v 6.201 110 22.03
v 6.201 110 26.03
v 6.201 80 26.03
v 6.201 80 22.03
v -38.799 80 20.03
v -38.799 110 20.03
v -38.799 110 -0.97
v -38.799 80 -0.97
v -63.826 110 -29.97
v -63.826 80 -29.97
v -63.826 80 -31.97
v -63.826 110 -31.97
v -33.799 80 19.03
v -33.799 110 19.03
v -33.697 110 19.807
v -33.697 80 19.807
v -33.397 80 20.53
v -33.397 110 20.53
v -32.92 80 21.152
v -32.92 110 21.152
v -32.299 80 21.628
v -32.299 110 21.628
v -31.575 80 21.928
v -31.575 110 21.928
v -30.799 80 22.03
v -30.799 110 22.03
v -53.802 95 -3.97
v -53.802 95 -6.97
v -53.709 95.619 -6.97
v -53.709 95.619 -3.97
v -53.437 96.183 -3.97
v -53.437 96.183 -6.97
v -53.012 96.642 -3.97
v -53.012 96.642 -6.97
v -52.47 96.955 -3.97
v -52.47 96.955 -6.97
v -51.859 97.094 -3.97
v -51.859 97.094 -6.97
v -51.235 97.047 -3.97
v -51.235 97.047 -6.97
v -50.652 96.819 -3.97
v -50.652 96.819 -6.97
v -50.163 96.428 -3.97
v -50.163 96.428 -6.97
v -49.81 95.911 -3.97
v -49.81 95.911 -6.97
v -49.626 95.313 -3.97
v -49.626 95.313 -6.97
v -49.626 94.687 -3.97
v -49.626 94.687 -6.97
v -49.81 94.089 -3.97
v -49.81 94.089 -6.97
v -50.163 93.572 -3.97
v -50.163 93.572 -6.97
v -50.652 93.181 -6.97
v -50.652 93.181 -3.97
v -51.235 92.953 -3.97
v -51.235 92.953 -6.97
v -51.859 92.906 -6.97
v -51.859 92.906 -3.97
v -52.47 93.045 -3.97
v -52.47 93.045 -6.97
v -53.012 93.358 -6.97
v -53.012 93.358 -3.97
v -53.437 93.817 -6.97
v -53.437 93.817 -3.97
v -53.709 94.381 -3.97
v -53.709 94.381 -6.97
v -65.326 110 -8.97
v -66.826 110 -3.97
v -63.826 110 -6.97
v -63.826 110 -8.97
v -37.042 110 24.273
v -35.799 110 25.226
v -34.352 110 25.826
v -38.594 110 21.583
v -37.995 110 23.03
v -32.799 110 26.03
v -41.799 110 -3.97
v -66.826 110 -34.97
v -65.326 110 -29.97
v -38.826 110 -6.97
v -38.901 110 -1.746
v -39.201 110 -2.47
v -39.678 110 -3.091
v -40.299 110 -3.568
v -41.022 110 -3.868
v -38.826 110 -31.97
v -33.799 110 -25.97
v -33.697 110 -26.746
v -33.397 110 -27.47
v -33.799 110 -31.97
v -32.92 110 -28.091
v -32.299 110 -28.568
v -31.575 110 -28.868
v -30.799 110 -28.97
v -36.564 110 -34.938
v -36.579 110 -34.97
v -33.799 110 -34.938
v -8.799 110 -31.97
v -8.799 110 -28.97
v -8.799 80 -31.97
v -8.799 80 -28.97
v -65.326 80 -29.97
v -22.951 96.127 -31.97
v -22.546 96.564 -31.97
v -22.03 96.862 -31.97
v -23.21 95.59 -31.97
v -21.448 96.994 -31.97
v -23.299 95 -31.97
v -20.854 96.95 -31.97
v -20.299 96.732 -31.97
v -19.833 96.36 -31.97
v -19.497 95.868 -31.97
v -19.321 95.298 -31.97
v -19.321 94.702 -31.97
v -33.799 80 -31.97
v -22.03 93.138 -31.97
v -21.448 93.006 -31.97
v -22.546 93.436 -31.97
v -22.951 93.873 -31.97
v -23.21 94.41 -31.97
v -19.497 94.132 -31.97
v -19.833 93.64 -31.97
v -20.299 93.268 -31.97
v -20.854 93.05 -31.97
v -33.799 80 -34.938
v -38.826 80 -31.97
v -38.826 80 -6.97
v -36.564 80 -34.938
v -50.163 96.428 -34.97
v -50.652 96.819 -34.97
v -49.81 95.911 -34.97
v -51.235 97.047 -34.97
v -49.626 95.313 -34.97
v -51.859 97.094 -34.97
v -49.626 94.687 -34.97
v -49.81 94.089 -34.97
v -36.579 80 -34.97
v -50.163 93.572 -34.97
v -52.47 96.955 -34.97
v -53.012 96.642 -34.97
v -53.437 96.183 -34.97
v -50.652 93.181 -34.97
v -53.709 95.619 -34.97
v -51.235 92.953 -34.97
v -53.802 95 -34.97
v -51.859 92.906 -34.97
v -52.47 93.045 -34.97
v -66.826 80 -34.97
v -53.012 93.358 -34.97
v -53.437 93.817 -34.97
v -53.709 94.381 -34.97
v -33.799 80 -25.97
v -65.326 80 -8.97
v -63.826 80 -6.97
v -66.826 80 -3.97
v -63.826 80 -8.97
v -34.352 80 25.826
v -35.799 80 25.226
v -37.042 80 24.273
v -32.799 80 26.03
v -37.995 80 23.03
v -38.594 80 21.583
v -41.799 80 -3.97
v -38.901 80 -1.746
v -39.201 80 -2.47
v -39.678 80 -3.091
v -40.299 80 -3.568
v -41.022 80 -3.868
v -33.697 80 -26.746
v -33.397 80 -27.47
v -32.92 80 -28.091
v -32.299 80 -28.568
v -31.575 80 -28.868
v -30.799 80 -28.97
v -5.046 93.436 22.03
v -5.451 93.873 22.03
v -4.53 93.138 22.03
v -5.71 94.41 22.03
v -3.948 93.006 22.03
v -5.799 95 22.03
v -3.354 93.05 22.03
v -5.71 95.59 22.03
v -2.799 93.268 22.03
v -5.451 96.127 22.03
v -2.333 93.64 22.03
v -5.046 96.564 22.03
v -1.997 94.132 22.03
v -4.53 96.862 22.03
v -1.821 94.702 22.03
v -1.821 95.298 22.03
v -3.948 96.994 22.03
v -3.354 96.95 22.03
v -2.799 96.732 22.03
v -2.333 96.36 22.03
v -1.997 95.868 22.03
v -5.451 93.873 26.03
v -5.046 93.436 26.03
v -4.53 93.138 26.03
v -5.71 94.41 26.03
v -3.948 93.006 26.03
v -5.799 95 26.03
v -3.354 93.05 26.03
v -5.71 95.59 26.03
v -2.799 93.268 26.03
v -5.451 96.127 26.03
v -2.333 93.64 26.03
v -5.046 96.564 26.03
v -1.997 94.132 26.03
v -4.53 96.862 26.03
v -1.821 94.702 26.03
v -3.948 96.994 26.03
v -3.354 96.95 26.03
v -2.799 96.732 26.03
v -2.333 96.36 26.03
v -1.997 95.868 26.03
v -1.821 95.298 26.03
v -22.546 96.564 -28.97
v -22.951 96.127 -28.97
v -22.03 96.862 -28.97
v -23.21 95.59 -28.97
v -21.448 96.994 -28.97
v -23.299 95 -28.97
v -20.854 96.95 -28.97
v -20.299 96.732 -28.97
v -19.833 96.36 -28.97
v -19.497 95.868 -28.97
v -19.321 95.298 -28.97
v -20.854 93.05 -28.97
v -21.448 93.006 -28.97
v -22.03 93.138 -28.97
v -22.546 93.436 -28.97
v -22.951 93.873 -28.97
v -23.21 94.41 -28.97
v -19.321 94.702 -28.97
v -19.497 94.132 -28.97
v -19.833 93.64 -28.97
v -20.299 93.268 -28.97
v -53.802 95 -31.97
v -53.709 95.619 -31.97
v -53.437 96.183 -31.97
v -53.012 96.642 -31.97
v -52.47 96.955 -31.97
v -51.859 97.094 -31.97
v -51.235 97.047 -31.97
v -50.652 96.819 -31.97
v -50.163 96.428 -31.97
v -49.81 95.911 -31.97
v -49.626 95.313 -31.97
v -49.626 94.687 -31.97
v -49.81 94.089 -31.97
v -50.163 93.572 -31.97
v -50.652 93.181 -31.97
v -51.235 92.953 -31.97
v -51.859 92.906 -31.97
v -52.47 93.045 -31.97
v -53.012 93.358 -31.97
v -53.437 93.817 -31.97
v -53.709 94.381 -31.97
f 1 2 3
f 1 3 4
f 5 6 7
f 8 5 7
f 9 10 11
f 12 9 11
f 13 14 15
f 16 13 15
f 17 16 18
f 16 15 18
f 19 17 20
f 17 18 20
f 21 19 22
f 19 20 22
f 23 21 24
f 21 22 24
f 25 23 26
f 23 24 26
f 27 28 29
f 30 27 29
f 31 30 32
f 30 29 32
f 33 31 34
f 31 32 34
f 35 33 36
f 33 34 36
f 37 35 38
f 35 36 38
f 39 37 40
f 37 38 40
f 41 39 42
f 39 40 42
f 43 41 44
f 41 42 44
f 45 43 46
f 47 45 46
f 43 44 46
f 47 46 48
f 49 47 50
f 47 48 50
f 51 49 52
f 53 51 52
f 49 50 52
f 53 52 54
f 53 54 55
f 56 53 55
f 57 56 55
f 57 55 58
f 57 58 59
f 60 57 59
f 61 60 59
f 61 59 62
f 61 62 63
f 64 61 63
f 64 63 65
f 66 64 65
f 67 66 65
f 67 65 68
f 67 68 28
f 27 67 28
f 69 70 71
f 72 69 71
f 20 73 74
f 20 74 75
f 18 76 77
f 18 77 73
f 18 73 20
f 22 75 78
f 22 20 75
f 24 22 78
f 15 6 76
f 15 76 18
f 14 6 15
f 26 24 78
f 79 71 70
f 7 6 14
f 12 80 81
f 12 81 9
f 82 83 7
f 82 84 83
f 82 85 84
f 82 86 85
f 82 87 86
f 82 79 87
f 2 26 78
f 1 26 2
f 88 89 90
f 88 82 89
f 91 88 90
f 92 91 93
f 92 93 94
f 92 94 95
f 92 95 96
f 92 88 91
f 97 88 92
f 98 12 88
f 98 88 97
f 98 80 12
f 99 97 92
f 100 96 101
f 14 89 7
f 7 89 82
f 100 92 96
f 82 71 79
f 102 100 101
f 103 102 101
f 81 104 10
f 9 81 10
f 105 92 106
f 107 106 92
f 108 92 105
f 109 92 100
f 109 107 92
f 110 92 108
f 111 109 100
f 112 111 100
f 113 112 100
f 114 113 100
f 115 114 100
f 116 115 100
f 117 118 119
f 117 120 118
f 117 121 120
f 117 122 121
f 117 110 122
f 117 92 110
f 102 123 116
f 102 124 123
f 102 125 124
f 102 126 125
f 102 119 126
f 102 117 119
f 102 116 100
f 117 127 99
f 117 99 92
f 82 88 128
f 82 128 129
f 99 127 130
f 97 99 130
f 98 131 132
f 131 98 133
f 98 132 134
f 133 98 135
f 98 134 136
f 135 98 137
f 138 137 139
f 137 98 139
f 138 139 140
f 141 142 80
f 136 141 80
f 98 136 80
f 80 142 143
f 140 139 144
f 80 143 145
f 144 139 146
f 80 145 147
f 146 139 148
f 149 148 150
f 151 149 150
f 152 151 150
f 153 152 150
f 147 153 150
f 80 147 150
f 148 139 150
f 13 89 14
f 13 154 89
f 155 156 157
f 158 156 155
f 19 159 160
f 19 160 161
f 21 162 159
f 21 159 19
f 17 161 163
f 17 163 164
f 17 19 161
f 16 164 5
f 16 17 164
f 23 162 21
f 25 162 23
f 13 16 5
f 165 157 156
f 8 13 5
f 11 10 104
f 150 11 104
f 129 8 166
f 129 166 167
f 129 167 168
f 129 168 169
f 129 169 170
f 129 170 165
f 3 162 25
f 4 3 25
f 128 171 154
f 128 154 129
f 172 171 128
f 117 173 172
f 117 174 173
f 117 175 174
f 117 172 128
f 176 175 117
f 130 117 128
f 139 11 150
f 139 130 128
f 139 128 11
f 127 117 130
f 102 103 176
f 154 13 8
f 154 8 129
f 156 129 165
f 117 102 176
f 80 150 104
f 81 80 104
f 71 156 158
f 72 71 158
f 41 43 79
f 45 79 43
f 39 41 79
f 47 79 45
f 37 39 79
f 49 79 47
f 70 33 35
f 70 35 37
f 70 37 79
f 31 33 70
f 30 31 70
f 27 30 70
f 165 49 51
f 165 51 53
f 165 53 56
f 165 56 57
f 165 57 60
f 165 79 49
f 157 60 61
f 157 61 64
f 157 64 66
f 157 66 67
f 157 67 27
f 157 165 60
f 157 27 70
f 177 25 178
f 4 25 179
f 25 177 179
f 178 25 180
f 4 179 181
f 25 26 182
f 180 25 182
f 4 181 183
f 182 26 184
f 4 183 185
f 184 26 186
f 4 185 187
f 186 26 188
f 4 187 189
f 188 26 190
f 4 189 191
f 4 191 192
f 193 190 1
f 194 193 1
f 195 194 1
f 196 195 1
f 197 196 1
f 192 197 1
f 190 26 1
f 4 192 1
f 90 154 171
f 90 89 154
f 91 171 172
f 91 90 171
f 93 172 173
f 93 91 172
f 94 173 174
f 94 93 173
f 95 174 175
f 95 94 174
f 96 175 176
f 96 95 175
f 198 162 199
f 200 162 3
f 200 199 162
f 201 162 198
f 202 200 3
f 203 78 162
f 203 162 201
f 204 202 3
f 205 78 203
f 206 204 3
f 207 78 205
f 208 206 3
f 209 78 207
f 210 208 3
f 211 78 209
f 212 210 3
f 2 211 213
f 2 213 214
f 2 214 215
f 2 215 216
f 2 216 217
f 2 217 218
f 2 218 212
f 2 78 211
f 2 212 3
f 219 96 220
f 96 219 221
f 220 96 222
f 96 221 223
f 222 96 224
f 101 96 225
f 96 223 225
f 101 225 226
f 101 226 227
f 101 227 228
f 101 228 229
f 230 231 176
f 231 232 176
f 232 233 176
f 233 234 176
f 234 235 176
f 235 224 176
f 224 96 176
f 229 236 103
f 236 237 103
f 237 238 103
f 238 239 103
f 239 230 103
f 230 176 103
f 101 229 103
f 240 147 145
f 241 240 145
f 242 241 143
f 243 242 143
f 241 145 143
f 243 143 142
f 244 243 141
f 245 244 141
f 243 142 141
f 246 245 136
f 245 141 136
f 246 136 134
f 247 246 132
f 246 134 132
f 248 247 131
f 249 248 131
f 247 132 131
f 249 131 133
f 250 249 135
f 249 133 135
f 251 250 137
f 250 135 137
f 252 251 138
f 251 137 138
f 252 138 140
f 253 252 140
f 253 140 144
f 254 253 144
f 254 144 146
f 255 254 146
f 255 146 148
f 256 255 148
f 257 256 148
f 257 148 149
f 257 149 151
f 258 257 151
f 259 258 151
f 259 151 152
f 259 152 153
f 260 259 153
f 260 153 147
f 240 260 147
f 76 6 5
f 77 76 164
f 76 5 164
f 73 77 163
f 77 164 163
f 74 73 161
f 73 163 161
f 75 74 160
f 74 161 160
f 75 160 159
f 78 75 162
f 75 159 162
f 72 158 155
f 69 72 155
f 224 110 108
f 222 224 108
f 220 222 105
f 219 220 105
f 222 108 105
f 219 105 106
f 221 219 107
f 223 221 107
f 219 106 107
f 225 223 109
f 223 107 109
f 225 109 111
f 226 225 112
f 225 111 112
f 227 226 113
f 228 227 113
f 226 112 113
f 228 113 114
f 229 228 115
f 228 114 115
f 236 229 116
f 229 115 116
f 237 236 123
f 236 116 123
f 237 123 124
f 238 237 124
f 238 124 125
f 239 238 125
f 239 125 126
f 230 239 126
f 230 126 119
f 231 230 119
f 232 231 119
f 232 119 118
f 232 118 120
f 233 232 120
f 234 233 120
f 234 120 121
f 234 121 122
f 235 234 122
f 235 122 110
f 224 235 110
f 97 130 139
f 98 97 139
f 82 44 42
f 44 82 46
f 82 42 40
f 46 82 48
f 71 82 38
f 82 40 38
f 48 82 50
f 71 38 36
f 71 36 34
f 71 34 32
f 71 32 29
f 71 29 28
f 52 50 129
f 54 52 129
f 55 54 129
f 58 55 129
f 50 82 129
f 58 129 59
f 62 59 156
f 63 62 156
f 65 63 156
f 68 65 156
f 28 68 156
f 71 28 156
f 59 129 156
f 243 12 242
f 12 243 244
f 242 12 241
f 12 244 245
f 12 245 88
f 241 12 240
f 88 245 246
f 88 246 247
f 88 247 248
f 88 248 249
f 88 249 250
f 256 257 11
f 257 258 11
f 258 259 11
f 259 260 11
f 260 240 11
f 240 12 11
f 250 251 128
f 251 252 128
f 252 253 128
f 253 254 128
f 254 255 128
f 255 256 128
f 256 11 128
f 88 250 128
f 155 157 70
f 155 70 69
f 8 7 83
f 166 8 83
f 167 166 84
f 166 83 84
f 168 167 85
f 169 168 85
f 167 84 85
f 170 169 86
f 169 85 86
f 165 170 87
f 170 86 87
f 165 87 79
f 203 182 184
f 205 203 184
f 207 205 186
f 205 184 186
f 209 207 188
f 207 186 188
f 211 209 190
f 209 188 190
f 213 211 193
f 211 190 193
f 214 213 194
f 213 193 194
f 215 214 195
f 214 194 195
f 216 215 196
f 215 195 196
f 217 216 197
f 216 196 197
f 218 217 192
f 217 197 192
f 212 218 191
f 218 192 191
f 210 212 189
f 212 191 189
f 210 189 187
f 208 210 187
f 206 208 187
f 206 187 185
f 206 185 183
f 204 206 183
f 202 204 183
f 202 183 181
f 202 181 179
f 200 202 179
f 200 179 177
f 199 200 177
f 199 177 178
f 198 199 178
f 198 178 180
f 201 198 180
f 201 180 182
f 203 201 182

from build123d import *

# Parameters (mm, degrees)
EXTRUDE_1_DEPTH      = 110
CUT_EXTRUDE_4_DEPTH  = 134.373777696
SKETCH_7_W           = 16.60831278
SKETCH_7_H           = 38.473598513
CUT_EXTRUDE_14_DEPTH = 134.373777696
SKETCH_8_W           = 5
SKETCH_8_H           = 30.968526609
EXTRUDE_2_DEPTH      = 110
SKETCH_10_W          = 5
SKETCH_10_H          = 26
EXTRUDE_4_DEPTH      = 110
SKETCH_16_W          = 45
SKETCH_16_H          = 4
EXTRUDE_7_DEPTH      = 110
FILLET_4_R           = 3
FILLET_5_R           = 6
SKETCH_18_W          = 113.67218818
SKETCH_18_H          = 61.649849458
CUT_EXTRUDE_18_DEPTH = 137.586229955
SKETCH_19_R          = 2.1
SKETCH_19_R_2        = 2
CUT_EXTRUDE_19_DEPTH = 143.431323365
SKETCH_22_W          = 25
SKETCH_22_H          = 3
EXTRUDE_10_DEPTH     = 30
FILLET_7_R           = 3
SKETCH_23_R          = 2
CUT_EXTRUDE_24_DEPTH = 10
SKETCH_24_W          = 79.129869038
SKETCH_24_H          = 20.357001259
CUT_EXTRUDE_25_DEPTH = 143.431323365


# Read off the part's stored shape, not the designer's step: Бобышка-Вытянуть1
with BuildPart() as part:
    # Бобышка-Вытянуть1 outline → Бобышка-Вытянуть1 (new body)
    with BuildSketch(Plane(origin=(0, 0, 0), x_dir=(1, 0, 0), z_dir=(0, 1, 0))):
        Polygon((-36.579007505, 34.969739794), (-66.825757576, 34.969739794), (-66.825757576, 29.969739794), (-63.825757576, 29.969739794), (-63.825757576, 31.969739794), (-38.825757576, 31.969739794), (-38.825757576, 6.969739794), (-63.825757576, 6.969739794), (-63.825757576, 8.969739794), (-66.825757576, 8.969739794), (-66.825757576, 3.969739794), (-22.123470102, 3.969739794), align=None)
    extrude(amount=EXTRUDE_1_DEPTH)

    # Эскиз3 → Вырез-Вытянуть4 (cut, through all)
    with BuildSketch(Plane.XZ):
        Polygon((-66.825757576, -3.969739794), (-65.325757576, -8.969739794), (-66.825757576, -8.969739794), align=None)
        Polygon((-66.825757576, -29.969739794), (-66.825757576, -34.969739794), (-65.325757576, -29.969739794), align=None)
    extrude(amount=-CUT_EXTRUDE_4_DEPTH, mode=Mode.SUBTRACT)

    # Эскиз7 → Вырез-Вытянуть14 (cut, through all)
    with BuildSketch(Plane(origin=(0, 0, 0), x_dir=(-1, 0, 0), z_dir=(0, -1, 0))):
        with Locations((27.703474463, 20.539743139)):
            Rectangle(SKETCH_7_W, SKETCH_7_H)
    extrude(amount=-CUT_EXTRUDE_14_DEPTH, mode=Mode.SUBTRACT)

    # Эскиз8 → Бобышка-Вытянуть2 (add)
    with BuildSketch(Plane(origin=(0, 0, 0), x_dir=(-1, 0, 0), z_dir=(0, -1, 0))):
        with Locations((36.298943925, 19.454003098)):
            Rectangle(SKETCH_8_W, SKETCH_8_H)
    extrude(amount=-EXTRUDE_2_DEPTH)

    # Эскиз10 → Бобышка-Вытянуть4 (add)
    with BuildSketch(Plane.XZ):
        with Locations((-36.298943925, 9.030260206)):
            Rectangle(SKETCH_10_W, SKETCH_10_H)
    extrude(amount=-EXTRUDE_4_DEPTH)

    # Эскиз16 → Бобышка-Вытянуть7 (add, through all)
    with BuildSketch(Plane(origin=(0, 110, 0), x_dir=(1, 0, 0), z_dir=(0, 1, 0))):
        with Locations((-16.298943925, -24.030260206)):
            Rectangle(SKETCH_16_W, SKETCH_16_H)
    extrude(amount=-EXTRUDE_7_DEPTH)

    # Скругление4
    fillet_4_edges = [part.edges().sort_by_distance(p)[0] for p in [
        (-38.798943925, 55, -3.969739794),
        (-33.798943925, 55, 22.030260206),
    ]]
    fillet(fillet_4_edges, radius=FILLET_4_R)

    # Скругление5
    fillet_5_edges = [part.edges().sort_by_distance(p)[0] for p in [
        (-38.798943925, 55, 26.030260206),
    ]]
    fillet(fillet_5_edges, radius=FILLET_5_R)

    # Эскиз18 → Вырез-Вытянуть18 (cut, through all)
    with BuildSketch(Plane(origin=(6.201056075, 0, 0), x_dir=(0, 0, -1), z_dir=(1, 0, 0))):
        with Locations((3.709673157, 49.175075271)):
            Rectangle(SKETCH_18_W, SKETCH_18_H)
    extrude(amount=-CUT_EXTRUDE_18_DEPTH, mode=Mode.SUBTRACT)


with BuildPart() as cut_extrude_18_piece_1:
    # of the separate pieces the step leaves, piece 1, a body of its own (cut_extrude_18_pieces)
    add(part.part.solids().sort_by_distance((-38.798943925, 110, 20.030260206))[0])

    # Эскиз19 → Вырез-Вытянуть19 (cut, through all)
    with BuildSketch(Plane(origin=(0, 0, -34.969739794), x_dir=(-1, 0, 0), z_dir=(0, 0, -1))):
        with Locations((51.70238254, 95)):
            Circle(SKETCH_19_R)
        with Locations((3.798943925, 95)):
            Circle(SKETCH_19_R_2)
    extrude(amount=-CUT_EXTRUDE_19_DEPTH, mode=Mode.SUBTRACT)

    # Эскиз22 → Бобышка-Вытянуть10 (add)
    with BuildSketch(Plane.XZ.offset(-80)):
        with Locations((-21.298943925, -30.469739794)):
            Rectangle(SKETCH_22_W, SKETCH_22_H)
    extrude(amount=-EXTRUDE_10_DEPTH)

    # Скругление7
    fillet_7_edges = [cut_extrude_18_piece_1.edges().sort_by_distance(p)[0] for p in [
        (-33.798943925, 95, -28.969739794),
    ]]
    fillet(fillet_7_edges, radius=FILLET_7_R)

    # Эскиз23 → Вырез-Вытянуть24 (cut)
    with BuildSketch(Plane(origin=(0, 0, -31.969739794), x_dir=(-1, 0, 0), z_dir=(0, 0, -1))):
        with Locations((21.298943925, 95)):
            Circle(SKETCH_23_R)
    extrude(amount=-CUT_EXTRUDE_24_DEPTH, mode=Mode.SUBTRACT)


with BuildPart() as cut_extrude_18_piece_2:
    # of the separate pieces the step leaves, piece 2, a body of its own (cut_extrude_18_pieces)
    add(part.part.solids().sort_by_distance((-38.798943925, 18.350150542, -0.969739794))[0])

    # Эскиз24 → Вырез-Вытянуть25 (cut, through all)
    with BuildSketch(Plane(origin=(0, 0, -34.969739794), x_dir=(-1, 0, 0), z_dir=(0, 0, -1))):
        with Locations((27.260823057, 8.171649913)):
            Rectangle(SKETCH_24_W, SKETCH_24_H)
    extrude(amount=-CUT_EXTRUDE_25_DEPTH, mode=Mode.SUBTRACT)


solid = cut_extrude_18_piece_1.part
